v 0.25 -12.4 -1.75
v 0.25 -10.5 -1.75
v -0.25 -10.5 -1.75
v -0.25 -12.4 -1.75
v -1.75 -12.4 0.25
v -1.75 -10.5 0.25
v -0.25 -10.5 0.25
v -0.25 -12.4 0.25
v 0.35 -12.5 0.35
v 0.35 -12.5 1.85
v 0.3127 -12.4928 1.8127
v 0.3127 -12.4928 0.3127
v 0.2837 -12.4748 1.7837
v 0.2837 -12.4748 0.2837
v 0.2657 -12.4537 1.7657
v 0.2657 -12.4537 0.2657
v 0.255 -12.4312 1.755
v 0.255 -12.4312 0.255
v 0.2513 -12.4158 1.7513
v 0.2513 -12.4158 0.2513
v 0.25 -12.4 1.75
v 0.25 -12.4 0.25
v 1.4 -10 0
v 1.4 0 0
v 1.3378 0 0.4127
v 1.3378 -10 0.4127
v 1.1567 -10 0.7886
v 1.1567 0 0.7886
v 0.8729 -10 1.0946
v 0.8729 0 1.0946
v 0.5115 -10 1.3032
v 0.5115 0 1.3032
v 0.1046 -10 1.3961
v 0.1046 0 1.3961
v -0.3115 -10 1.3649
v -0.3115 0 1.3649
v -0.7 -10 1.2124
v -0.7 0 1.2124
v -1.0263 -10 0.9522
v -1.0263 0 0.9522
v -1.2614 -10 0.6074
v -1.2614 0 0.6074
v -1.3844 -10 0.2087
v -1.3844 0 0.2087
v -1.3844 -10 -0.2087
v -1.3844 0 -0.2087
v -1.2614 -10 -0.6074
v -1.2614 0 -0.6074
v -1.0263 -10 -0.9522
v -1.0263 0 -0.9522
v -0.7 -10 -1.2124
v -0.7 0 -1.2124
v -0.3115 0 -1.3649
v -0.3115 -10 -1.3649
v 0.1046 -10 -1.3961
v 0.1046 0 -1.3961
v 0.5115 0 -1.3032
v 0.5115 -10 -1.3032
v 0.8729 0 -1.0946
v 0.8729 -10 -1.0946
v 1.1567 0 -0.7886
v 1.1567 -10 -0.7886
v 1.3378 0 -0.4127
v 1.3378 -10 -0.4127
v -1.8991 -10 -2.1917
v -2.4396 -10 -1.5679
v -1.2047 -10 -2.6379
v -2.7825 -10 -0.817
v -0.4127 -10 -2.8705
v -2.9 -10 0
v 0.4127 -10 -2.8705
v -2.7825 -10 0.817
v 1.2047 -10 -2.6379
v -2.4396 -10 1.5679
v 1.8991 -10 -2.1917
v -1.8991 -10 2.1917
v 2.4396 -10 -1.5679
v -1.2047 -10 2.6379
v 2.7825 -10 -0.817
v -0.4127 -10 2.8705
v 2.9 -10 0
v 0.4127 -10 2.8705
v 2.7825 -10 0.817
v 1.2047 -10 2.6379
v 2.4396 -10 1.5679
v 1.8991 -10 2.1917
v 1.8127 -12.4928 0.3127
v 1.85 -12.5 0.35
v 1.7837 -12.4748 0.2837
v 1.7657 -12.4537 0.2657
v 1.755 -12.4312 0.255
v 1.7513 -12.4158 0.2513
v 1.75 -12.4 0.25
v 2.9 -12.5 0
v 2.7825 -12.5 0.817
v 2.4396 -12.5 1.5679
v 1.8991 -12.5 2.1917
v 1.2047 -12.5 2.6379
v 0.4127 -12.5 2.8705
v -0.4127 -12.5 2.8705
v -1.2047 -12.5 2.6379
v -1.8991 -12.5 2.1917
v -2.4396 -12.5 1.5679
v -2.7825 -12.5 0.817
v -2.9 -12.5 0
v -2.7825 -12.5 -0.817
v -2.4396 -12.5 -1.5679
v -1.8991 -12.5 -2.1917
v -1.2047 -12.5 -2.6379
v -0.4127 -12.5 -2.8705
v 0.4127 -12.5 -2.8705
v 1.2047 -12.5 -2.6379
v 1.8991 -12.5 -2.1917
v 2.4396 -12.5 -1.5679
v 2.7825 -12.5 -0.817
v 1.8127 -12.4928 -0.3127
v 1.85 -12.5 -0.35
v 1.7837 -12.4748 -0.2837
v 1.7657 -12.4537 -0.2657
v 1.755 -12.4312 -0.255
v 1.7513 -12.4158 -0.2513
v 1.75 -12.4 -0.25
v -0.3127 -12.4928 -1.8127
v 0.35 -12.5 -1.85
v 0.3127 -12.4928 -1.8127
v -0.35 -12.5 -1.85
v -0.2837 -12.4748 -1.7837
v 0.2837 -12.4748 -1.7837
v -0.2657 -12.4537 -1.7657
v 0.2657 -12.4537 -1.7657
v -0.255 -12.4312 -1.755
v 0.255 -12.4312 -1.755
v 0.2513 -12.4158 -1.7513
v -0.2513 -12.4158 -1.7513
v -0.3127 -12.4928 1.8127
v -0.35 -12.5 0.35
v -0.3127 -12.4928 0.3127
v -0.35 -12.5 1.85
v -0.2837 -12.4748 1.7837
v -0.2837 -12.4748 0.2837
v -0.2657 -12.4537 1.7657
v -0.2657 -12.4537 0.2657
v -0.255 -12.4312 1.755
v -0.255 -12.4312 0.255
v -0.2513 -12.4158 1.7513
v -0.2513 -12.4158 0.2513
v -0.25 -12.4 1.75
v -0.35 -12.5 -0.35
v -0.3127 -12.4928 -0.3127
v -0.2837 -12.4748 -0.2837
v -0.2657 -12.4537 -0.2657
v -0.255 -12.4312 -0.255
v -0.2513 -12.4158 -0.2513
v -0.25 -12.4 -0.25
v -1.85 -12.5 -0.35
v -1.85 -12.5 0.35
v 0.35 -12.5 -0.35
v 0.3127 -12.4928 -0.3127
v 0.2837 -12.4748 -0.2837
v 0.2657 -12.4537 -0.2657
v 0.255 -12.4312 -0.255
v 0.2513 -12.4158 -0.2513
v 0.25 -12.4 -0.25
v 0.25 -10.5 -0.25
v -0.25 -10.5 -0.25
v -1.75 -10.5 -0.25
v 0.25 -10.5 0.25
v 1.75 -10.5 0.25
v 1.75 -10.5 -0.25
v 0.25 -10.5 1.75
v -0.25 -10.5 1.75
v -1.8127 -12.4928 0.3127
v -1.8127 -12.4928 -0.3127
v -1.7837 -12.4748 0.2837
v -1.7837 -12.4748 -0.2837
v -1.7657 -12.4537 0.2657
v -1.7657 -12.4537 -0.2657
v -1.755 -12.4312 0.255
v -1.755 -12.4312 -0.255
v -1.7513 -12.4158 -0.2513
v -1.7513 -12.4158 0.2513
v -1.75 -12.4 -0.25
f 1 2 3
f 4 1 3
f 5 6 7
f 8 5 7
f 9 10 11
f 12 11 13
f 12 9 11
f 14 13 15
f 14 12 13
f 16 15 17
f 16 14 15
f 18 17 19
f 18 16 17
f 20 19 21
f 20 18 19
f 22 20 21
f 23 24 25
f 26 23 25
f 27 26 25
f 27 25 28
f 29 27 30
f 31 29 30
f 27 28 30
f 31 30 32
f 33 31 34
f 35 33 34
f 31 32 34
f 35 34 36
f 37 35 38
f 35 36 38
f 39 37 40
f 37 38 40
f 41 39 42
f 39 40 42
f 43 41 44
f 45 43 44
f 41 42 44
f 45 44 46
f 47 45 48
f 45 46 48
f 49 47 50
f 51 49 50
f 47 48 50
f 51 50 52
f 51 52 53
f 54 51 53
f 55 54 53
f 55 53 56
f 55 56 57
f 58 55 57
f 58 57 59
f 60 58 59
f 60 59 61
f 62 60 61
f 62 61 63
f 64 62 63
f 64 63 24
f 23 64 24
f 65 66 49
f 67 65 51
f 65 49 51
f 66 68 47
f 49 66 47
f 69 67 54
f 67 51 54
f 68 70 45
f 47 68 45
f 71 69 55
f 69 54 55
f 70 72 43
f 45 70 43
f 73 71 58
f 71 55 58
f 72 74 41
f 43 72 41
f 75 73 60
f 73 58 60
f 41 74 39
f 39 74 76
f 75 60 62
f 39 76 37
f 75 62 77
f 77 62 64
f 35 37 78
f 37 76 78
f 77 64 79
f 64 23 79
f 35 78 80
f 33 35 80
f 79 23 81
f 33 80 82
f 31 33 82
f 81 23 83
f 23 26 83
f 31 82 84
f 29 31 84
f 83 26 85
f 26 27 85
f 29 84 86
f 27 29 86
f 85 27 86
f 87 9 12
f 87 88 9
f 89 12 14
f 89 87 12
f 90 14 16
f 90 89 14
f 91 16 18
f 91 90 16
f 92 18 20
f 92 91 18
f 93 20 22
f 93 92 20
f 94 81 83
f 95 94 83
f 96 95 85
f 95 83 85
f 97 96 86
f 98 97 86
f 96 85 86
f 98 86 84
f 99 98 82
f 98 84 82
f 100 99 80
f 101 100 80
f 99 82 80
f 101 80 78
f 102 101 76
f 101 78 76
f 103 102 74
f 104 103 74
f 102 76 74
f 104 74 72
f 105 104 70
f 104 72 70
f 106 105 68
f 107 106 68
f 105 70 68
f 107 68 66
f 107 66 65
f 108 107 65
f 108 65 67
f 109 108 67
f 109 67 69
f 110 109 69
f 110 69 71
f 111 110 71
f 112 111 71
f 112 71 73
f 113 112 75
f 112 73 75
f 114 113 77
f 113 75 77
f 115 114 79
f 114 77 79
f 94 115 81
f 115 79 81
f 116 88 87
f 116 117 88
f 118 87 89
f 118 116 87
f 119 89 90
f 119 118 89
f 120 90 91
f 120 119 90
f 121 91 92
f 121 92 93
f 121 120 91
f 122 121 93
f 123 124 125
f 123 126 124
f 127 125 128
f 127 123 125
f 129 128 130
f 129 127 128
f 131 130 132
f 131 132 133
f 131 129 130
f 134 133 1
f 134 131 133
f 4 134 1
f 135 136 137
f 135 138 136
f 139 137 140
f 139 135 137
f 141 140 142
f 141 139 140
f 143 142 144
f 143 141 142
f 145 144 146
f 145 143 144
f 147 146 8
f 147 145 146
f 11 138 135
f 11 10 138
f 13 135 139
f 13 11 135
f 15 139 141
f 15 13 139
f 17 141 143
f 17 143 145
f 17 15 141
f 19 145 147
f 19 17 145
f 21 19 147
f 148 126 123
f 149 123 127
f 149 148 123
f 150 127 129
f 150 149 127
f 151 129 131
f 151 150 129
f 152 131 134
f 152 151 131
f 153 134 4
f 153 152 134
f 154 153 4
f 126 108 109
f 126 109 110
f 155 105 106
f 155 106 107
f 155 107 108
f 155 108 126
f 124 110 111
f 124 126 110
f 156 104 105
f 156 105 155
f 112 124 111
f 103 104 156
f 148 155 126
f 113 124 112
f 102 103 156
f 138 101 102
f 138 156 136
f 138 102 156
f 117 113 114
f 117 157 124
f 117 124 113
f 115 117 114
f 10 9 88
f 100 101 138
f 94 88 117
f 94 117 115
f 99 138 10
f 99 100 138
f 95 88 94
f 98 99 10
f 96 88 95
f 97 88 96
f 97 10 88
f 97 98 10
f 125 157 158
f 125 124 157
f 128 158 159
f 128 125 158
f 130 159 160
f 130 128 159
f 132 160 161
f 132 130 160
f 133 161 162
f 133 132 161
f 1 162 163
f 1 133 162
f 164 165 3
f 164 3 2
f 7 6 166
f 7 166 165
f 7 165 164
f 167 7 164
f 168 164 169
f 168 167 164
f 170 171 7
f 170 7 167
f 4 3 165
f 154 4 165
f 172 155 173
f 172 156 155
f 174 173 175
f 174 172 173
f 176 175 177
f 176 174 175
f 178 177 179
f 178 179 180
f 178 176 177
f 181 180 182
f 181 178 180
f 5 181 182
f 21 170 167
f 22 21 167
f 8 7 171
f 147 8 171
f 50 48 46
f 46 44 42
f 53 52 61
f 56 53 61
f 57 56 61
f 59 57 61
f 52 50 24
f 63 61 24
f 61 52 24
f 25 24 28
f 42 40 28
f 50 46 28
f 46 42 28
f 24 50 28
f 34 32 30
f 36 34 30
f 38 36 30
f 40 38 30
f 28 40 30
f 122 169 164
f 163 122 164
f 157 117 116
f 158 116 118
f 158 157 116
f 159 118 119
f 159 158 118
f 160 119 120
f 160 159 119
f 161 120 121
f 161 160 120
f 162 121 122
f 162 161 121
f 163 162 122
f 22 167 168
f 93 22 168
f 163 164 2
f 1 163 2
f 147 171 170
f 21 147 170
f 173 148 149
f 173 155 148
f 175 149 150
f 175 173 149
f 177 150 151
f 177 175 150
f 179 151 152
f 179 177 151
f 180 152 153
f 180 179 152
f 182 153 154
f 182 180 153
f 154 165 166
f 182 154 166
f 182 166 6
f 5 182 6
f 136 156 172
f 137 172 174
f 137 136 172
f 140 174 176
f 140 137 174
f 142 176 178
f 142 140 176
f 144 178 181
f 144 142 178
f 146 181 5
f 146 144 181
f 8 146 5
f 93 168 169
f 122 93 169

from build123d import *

# Parameters (mm, degrees)
F0_R     = 1.4
F1_DEPTH = 10
F3_R     = 2.9
F4_DEPTH = 2.5
F3_W     = 0.5
F3_H     = 0.5
F3_W_2   = 1.5
F3_H_2   = 1.5
F5_DEPTH = 0.5
F6_R     = 0.1


with BuildPart() as f1:
    # F0 (on Front) → F1 (new body)
    with BuildSketch(Plane.XZ):
        Circle(F0_R)
    extrude(amount=F1_DEPTH)

    # F3 (on offset) → F4 (join)
    with BuildSketch(Plane.XZ.offset(10)):
        Circle(F3_R)
        Polygon((0.25, -0.25), (0.25, -1.75), (-0.25, -1.75), (-0.25, -0.25), (-1.75, -0.25), (-1.75, 0.25), (-0.25, 0.25), (-0.25, 1.75), (0.25, 1.75), (0.25, 0.25), (1.75, 0.25), (1.75, -0.25), align=None, mode=Mode.SUBTRACT)
    extrude(amount=F4_DEPTH)

    # F3 (on offset) → F5 (join)
    with BuildSketch(Plane.XZ.offset(10)):
        Rectangle(F3_W, F3_H)
        with Locations((-1, 0)):
            Rectangle(F3_W_2, F3_H)
        with Locations((0, -1)):
            Rectangle(F3_W, F3_H_2)
        with Locations((1, 0)):
            Rectangle(F3_W_2, F3_H)
        with Locations((0, 1)):
            Rectangle(F3_W, F3_H_2)
    extrude(amount=F5_DEPTH)

    # F6
    f6_edges = [f1.edges().sort_by_distance(p)[0] for p in [
        (-0.25, -12.5, 1),
        (-1, -12.5, 0.25),
        (-1, -12.5, -0.25),
        (-0.25, -12.5, -1),
        (-1.75, -12.5, 0),
        (0.25, -12.5, -1),
        (0, -12.5, -1.75),
        (1, -12.5, -0.25),
        (1.75, -12.5, 0),
        (0.25, -12.5, 1),
        (0, -12.5, 1.75),
        (1, -12.5, 0.25),
    ]]
    fillet(f6_edges, radius=F6_R)


solid = f1.part
